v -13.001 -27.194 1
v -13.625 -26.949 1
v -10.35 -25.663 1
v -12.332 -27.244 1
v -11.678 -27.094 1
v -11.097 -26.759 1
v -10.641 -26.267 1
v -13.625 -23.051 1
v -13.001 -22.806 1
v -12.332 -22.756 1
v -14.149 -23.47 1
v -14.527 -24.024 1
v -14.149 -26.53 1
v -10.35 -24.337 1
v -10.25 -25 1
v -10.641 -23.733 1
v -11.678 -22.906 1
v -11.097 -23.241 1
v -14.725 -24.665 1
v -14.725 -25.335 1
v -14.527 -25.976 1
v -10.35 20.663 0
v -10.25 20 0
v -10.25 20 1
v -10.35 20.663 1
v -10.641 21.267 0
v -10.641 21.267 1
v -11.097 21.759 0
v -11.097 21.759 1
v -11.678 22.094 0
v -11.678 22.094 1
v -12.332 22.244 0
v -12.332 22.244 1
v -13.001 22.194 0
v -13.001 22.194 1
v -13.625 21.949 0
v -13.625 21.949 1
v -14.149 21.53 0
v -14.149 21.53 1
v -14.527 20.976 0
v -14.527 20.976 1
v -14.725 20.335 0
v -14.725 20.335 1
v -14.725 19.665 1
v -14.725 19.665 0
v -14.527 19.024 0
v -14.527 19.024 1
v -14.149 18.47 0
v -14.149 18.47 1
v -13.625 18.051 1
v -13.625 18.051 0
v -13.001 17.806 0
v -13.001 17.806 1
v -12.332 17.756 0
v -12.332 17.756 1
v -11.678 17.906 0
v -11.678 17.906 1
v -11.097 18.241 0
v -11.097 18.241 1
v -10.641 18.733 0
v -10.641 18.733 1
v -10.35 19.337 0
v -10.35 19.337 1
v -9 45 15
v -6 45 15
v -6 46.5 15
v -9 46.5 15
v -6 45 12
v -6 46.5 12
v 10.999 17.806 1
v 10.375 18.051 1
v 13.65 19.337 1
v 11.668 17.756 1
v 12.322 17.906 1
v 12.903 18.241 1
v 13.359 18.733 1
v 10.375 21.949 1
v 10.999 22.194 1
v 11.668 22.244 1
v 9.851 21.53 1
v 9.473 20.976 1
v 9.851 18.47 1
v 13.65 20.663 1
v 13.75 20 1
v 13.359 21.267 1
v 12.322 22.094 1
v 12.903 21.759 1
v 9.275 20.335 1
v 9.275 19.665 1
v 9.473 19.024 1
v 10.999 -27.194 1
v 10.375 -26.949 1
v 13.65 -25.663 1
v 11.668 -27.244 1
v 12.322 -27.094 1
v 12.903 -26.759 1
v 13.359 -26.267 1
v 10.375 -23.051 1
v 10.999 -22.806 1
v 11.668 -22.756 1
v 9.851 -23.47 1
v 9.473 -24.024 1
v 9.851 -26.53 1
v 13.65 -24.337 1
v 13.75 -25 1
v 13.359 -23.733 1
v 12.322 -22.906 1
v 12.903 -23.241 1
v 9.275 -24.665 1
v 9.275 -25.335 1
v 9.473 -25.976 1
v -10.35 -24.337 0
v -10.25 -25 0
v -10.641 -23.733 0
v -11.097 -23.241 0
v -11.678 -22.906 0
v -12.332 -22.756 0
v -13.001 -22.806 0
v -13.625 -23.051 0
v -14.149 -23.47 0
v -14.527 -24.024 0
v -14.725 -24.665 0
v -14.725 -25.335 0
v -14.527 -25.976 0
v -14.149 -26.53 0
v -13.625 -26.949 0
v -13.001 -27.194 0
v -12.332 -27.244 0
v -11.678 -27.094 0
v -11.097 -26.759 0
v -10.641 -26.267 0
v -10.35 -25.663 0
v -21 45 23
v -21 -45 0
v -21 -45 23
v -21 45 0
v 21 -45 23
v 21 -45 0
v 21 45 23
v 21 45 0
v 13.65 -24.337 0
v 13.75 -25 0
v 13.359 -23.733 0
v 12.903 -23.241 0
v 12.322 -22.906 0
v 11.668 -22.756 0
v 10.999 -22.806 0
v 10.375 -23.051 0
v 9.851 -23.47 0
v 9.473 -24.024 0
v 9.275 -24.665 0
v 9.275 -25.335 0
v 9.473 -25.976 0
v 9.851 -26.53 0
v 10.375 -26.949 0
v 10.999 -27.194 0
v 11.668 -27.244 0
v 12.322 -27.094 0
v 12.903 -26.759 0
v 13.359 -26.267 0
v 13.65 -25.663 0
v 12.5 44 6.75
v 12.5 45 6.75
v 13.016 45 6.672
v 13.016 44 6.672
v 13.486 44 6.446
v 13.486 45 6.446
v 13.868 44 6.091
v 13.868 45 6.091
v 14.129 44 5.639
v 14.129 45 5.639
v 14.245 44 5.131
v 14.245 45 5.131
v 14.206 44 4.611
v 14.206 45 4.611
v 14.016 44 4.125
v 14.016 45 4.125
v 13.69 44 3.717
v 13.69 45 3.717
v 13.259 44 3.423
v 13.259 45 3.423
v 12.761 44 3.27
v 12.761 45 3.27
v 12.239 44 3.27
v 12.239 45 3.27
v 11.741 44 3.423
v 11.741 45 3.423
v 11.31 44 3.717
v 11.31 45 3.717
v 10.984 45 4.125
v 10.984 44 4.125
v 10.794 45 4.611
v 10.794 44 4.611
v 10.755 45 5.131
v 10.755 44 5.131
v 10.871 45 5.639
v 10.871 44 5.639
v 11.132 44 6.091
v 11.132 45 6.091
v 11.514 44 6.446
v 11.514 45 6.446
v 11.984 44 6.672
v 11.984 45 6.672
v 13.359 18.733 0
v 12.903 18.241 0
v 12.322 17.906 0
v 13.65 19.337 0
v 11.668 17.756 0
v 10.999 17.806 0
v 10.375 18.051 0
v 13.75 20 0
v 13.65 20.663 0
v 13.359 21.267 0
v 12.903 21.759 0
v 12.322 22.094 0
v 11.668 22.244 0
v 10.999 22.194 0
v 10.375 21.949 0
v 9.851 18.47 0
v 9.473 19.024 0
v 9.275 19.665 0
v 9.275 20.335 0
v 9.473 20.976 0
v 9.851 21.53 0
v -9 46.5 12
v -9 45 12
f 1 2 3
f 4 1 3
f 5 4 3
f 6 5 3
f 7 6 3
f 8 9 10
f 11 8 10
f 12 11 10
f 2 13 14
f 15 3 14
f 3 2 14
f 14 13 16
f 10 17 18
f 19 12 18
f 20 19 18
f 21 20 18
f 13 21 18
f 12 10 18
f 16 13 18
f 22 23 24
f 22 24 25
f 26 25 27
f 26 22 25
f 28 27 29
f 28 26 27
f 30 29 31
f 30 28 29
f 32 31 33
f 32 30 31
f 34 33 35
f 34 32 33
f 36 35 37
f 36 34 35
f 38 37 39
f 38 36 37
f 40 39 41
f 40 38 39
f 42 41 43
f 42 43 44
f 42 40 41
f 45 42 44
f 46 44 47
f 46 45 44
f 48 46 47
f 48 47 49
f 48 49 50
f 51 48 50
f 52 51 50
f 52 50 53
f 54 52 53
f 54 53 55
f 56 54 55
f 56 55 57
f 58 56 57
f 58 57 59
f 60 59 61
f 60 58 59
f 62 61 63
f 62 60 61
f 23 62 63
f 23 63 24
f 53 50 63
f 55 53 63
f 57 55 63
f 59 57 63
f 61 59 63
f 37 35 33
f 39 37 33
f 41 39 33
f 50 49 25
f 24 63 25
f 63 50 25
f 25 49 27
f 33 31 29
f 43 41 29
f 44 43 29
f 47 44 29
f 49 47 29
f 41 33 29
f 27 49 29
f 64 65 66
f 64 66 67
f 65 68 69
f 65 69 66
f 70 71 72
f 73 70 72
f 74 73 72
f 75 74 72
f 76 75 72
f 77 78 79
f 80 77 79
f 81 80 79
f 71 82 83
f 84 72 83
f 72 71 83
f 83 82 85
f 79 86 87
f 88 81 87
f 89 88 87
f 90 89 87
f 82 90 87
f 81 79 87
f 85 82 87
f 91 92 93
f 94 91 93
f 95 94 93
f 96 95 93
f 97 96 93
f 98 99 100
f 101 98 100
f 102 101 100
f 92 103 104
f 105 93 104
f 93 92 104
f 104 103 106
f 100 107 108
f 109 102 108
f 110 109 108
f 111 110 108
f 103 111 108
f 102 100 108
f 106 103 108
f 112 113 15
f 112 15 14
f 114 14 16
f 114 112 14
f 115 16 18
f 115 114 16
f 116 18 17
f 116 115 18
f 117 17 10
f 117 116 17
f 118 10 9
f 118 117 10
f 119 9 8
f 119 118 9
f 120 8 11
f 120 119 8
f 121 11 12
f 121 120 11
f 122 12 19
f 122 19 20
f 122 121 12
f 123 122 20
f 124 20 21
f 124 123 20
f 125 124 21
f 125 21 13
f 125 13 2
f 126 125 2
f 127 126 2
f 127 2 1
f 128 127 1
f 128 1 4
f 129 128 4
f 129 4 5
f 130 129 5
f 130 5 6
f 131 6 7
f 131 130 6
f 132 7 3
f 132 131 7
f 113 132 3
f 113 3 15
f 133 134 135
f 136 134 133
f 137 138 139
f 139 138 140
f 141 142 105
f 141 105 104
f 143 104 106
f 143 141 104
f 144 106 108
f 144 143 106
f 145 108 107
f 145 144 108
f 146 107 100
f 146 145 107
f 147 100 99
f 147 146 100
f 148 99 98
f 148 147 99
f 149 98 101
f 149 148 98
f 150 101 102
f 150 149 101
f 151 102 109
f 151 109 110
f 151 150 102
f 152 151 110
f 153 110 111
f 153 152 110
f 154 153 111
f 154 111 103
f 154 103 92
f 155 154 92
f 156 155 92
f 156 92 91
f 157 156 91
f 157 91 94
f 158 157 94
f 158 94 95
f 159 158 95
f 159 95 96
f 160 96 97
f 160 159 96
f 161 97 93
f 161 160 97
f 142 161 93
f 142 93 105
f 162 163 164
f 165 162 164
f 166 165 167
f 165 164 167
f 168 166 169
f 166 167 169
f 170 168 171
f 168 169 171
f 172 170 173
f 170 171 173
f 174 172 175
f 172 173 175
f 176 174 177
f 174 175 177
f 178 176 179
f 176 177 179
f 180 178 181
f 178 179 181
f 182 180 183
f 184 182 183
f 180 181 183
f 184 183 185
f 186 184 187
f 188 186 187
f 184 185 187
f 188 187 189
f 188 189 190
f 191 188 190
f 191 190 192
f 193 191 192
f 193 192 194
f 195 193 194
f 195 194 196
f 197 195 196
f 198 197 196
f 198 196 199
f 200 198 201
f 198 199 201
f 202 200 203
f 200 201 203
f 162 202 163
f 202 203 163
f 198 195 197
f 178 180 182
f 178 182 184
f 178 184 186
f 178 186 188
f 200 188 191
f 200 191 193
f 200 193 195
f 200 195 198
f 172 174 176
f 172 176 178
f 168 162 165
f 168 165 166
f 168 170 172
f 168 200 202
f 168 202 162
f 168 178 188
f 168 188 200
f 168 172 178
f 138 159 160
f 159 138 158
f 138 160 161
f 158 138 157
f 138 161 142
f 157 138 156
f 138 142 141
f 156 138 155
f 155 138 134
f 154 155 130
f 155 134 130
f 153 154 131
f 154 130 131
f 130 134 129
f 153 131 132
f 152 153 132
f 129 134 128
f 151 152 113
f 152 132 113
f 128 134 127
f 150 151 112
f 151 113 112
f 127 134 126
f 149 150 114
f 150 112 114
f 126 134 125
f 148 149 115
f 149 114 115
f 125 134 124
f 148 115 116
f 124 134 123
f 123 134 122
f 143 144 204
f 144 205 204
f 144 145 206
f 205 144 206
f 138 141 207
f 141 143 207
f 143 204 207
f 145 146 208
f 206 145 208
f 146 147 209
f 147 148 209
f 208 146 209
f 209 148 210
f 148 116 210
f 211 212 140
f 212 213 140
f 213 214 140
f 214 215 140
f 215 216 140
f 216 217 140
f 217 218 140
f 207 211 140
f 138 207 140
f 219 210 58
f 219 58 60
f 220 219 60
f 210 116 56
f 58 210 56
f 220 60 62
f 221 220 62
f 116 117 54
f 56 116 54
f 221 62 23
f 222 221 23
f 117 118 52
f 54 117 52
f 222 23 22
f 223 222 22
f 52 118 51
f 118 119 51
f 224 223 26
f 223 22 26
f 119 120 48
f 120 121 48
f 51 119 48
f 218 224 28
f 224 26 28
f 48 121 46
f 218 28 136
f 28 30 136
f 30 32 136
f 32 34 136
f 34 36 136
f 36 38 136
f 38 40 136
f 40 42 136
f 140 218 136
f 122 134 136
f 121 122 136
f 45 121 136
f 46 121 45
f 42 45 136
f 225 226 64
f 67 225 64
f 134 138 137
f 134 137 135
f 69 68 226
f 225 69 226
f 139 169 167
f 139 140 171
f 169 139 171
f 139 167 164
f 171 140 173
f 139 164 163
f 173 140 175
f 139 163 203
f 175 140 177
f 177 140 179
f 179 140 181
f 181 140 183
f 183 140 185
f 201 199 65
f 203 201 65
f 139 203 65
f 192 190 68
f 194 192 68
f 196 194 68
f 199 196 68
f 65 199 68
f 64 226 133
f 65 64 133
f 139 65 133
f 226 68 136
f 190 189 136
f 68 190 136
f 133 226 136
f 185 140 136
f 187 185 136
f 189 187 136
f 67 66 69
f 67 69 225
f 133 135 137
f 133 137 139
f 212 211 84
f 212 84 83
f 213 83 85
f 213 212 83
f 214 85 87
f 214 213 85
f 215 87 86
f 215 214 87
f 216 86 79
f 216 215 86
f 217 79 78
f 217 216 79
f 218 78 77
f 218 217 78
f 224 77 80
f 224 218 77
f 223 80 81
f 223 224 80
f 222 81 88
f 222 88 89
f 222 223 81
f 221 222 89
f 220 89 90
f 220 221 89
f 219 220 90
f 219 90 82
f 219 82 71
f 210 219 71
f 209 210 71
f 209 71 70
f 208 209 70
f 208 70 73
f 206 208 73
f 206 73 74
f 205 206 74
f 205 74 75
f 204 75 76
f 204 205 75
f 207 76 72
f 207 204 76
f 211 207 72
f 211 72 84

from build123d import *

# Parameters (mm, degrees)
SKETCH1_W           = 90
SKETCH1_H           = 42
BOSS_EXTRUDE1_DEPTH = 23
SKETCH1_3_R         = 2.25
CUT_EXTRUDE1_DEPTH  = 1
SKETCH2_R           = 1.75
CUT_EXTRUDE2_DEPTH  = 1
SKETCH2_3_W         = 3
SKETCH2_3_H         = 3
BOSS_EXTRUDE2_DEPTH = 1.5


with BuildPart() as part:
    # Sketch1 → Boss-Extrude1 (new body)
    with BuildSketch(Plane(origin=(0, 0, 0), x_dir=(0, 1, 0), z_dir=(0, 0, 1))):
        Rectangle(SKETCH1_W, SKETCH1_H)
    extrude(amount=BOSS_EXTRUDE1_DEPTH)

    # Sketch1<3> → Cut-Extrude1 (cut)
    with BuildSketch(Plane(origin=(0, 0, 0), x_dir=(0, 1, 0), z_dir=(0, 0, 1))):
        with Locations((-25, 12.5)):
            Circle(SKETCH1_3_R)
        with Locations((-25, -11.5)):
            Circle(SKETCH1_3_R)
        with Locations((20, -11.5)):
            Circle(SKETCH1_3_R)
        with Locations((20, 12.5)):
            Circle(SKETCH1_3_R)
    extrude(amount=CUT_EXTRUDE1_DEPTH, mode=Mode.SUBTRACT)

    # Sketch2 → Cut-Extrude2 (cut)
    with BuildSketch(Plane(origin=(0, 45, 0), x_dir=(-1, 0, 0), z_dir=(0, 1, 0))):
        with Locations((-12.5, 5)):
            Circle(SKETCH2_R)
    extrude(amount=-CUT_EXTRUDE2_DEPTH, mode=Mode.SUBTRACT)

    # Sketch2<3> → Boss-Extrude2 (add)
    with BuildSketch(Plane(origin=(0, 45, 0), x_dir=(-1, 0, 0), z_dir=(0, 1, 0))):
        with Locations((7.5, 13.5)):
            Rectangle(SKETCH2_3_W, SKETCH2_3_H)
    extrude(amount=BOSS_EXTRUDE2_DEPTH)


solid = part.part
